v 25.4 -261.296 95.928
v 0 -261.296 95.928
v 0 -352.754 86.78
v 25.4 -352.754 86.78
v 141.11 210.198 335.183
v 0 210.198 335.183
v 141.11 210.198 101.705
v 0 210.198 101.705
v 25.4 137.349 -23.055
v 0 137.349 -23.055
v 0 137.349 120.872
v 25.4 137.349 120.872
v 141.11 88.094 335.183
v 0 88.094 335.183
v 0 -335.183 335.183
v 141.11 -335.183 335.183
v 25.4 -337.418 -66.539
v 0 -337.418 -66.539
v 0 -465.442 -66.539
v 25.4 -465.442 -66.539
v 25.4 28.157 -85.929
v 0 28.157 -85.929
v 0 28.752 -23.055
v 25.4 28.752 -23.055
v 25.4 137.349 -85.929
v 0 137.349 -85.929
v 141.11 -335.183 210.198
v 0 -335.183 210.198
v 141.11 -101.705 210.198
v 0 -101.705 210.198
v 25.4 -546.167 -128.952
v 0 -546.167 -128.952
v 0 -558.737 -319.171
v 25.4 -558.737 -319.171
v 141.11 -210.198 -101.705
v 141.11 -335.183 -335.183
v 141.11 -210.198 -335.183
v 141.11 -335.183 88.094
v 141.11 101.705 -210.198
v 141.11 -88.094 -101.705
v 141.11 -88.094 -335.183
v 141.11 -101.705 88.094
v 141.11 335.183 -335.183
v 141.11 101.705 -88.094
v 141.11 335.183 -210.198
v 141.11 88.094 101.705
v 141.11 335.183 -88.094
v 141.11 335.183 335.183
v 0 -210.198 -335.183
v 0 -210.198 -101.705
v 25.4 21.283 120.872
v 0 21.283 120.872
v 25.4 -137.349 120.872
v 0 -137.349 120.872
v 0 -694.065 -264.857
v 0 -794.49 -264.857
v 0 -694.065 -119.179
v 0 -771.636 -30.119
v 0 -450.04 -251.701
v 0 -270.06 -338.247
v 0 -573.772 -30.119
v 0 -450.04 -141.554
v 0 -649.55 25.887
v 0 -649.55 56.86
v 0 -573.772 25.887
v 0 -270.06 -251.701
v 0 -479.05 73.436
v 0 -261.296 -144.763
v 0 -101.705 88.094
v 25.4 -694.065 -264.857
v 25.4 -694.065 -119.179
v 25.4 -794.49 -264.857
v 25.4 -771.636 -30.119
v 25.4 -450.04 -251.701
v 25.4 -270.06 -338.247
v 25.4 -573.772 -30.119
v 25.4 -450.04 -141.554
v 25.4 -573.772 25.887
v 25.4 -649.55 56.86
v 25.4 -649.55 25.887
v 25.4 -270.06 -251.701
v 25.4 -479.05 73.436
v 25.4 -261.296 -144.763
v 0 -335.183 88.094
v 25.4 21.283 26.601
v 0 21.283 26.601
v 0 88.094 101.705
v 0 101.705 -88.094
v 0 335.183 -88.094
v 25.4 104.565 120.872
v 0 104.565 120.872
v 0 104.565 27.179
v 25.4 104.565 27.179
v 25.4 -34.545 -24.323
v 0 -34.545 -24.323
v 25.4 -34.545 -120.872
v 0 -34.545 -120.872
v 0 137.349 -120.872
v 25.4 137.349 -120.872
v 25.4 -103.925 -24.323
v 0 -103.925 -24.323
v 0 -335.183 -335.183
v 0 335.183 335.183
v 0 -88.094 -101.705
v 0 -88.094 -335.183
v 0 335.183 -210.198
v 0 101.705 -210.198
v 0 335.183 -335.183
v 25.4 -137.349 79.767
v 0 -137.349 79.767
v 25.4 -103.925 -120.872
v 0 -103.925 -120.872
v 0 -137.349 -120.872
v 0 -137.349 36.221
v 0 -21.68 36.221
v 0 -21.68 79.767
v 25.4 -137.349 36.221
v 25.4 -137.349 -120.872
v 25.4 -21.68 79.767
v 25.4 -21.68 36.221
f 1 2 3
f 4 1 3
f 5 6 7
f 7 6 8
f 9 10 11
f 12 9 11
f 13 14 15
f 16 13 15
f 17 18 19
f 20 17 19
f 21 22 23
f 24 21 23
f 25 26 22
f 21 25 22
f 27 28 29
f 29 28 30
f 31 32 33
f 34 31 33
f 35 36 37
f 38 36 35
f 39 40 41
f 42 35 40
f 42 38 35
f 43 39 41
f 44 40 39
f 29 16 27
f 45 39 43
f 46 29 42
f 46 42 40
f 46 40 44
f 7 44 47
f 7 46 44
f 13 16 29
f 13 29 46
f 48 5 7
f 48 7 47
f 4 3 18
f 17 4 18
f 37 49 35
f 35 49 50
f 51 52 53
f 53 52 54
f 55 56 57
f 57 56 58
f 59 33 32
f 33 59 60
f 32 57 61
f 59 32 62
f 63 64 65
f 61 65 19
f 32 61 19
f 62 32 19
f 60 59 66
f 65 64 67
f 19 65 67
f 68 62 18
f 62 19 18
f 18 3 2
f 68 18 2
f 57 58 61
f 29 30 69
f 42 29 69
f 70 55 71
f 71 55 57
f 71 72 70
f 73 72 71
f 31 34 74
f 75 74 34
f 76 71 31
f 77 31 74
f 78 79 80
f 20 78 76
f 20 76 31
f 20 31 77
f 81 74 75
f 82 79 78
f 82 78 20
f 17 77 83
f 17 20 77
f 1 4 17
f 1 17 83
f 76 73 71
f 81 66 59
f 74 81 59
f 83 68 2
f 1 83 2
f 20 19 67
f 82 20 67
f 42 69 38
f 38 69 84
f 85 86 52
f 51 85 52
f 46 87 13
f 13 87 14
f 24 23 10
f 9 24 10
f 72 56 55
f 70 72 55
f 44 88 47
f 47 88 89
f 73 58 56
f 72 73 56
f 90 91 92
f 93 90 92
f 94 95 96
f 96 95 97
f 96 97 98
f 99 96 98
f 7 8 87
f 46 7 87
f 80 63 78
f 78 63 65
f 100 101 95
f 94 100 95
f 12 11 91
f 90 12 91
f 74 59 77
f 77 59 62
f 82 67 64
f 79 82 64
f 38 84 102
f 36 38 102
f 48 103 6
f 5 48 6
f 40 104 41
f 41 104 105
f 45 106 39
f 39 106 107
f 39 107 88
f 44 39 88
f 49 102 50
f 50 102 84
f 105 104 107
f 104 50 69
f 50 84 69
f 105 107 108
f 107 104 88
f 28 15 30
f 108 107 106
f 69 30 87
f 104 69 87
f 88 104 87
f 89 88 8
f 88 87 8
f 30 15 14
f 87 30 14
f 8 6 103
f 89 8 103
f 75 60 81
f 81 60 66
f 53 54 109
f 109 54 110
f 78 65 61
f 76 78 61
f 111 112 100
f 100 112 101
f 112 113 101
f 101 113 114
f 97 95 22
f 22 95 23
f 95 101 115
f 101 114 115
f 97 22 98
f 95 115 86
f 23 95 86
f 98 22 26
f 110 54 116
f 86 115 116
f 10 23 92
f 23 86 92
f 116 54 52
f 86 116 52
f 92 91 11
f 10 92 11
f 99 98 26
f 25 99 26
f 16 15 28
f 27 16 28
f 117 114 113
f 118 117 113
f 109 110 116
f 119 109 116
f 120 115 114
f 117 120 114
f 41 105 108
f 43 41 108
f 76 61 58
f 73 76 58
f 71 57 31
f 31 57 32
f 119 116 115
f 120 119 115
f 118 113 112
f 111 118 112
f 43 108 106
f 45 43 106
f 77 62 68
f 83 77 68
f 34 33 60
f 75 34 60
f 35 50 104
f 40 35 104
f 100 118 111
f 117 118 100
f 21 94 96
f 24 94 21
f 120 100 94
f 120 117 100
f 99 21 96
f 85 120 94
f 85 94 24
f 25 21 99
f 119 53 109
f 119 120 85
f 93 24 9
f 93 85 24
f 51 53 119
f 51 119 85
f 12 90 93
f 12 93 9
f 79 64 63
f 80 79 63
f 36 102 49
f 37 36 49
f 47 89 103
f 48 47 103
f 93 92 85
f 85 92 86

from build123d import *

# Parameters (mm, degrees)
F2_DEPTH = 25.4
F3_DEPTH = 25.4
F5_DEPTH = 141.1097


with BuildPart() as f2:
    # F0 (on Right) → F2 (new body)
    with BuildSketch(Plane.YZ):
        Polygon((-137.349337, 36.220565), (-137.349337, -120.871961), (-103.925407, -120.871961), (-103.925407, -24.323165), (-34.545362, -24.323165), (-34.545362, -120.871961), (137.349337, -120.871961), (137.349337, -85.929275), (28.157294, -85.929275), (28.752163, -23.0546), (137.349337, -23.0546), (137.349337, 120.871961), (104.565293, 120.871961), (104.565293, 27.17904), (21.283209, 26.600689), (21.283209, 120.871961), (-137.349337, 120.871961), (-137.349337, 79.767376), (-21.679759, 79.767376), (-21.679759, 36.220565), align=None)
    extrude(amount=F2_DEPTH)


with BuildPart() as f3:
    # F1 (on Right) → F3 (new body)
    with BuildSketch(Plane.YZ):
        Polygon((-479.050279, 73.436208), (-649.549842, 56.859858), (-649.549842, 25.887281), (-573.772311, 25.887281), (-573.772311, -30.119002), (-771.636009, -30.119002), (-794.489622, -264.856696), (-694.065072, -264.856696), (-694.065072, -119.178703), (-546.167173, -128.951918), (-558.73704, -319.171488), (-270.06042, -338.247478), (-270.06042, -251.700848), (-450.039864, -251.700848), (-450.039864, -141.553611), (-261.296423, -144.76271), (-261.296423, 95.928185), (-352.754235, 86.779982), (-337.418318, -66.538586), (-465.441615, -66.538586), align=None)
    extrude(amount=F3_DEPTH)


with BuildPart() as f5:
    # F4 (on Right) → F5 (new body)
    with BuildSketch(Plane.YZ):
        Polygon((-335.183496, 88.093936), (-335.183496, -335.183496), (-210.197985, -335.183496), (-210.197985, -101.705164), (-88.093936, -101.705164), (-88.093936, -335.183496), (335.183496, -335.183496), (335.183496, -210.197985), (101.705164, -210.197985), (101.705164, -88.093936), (335.183496, -88.093936), (335.183496, 335.183496), (210.197985, 335.183496), (210.197985, 101.705164), (88.093936, 101.705164), (88.093936, 335.183496), (-335.183496, 335.183496), (-335.183496, 210.197985), (-101.705164, 210.197985), (-101.705164, 88.093936), align=None)
    extrude(amount=F5_DEPTH)


solid = Compound([f2.part, f3.part, f5.part])
